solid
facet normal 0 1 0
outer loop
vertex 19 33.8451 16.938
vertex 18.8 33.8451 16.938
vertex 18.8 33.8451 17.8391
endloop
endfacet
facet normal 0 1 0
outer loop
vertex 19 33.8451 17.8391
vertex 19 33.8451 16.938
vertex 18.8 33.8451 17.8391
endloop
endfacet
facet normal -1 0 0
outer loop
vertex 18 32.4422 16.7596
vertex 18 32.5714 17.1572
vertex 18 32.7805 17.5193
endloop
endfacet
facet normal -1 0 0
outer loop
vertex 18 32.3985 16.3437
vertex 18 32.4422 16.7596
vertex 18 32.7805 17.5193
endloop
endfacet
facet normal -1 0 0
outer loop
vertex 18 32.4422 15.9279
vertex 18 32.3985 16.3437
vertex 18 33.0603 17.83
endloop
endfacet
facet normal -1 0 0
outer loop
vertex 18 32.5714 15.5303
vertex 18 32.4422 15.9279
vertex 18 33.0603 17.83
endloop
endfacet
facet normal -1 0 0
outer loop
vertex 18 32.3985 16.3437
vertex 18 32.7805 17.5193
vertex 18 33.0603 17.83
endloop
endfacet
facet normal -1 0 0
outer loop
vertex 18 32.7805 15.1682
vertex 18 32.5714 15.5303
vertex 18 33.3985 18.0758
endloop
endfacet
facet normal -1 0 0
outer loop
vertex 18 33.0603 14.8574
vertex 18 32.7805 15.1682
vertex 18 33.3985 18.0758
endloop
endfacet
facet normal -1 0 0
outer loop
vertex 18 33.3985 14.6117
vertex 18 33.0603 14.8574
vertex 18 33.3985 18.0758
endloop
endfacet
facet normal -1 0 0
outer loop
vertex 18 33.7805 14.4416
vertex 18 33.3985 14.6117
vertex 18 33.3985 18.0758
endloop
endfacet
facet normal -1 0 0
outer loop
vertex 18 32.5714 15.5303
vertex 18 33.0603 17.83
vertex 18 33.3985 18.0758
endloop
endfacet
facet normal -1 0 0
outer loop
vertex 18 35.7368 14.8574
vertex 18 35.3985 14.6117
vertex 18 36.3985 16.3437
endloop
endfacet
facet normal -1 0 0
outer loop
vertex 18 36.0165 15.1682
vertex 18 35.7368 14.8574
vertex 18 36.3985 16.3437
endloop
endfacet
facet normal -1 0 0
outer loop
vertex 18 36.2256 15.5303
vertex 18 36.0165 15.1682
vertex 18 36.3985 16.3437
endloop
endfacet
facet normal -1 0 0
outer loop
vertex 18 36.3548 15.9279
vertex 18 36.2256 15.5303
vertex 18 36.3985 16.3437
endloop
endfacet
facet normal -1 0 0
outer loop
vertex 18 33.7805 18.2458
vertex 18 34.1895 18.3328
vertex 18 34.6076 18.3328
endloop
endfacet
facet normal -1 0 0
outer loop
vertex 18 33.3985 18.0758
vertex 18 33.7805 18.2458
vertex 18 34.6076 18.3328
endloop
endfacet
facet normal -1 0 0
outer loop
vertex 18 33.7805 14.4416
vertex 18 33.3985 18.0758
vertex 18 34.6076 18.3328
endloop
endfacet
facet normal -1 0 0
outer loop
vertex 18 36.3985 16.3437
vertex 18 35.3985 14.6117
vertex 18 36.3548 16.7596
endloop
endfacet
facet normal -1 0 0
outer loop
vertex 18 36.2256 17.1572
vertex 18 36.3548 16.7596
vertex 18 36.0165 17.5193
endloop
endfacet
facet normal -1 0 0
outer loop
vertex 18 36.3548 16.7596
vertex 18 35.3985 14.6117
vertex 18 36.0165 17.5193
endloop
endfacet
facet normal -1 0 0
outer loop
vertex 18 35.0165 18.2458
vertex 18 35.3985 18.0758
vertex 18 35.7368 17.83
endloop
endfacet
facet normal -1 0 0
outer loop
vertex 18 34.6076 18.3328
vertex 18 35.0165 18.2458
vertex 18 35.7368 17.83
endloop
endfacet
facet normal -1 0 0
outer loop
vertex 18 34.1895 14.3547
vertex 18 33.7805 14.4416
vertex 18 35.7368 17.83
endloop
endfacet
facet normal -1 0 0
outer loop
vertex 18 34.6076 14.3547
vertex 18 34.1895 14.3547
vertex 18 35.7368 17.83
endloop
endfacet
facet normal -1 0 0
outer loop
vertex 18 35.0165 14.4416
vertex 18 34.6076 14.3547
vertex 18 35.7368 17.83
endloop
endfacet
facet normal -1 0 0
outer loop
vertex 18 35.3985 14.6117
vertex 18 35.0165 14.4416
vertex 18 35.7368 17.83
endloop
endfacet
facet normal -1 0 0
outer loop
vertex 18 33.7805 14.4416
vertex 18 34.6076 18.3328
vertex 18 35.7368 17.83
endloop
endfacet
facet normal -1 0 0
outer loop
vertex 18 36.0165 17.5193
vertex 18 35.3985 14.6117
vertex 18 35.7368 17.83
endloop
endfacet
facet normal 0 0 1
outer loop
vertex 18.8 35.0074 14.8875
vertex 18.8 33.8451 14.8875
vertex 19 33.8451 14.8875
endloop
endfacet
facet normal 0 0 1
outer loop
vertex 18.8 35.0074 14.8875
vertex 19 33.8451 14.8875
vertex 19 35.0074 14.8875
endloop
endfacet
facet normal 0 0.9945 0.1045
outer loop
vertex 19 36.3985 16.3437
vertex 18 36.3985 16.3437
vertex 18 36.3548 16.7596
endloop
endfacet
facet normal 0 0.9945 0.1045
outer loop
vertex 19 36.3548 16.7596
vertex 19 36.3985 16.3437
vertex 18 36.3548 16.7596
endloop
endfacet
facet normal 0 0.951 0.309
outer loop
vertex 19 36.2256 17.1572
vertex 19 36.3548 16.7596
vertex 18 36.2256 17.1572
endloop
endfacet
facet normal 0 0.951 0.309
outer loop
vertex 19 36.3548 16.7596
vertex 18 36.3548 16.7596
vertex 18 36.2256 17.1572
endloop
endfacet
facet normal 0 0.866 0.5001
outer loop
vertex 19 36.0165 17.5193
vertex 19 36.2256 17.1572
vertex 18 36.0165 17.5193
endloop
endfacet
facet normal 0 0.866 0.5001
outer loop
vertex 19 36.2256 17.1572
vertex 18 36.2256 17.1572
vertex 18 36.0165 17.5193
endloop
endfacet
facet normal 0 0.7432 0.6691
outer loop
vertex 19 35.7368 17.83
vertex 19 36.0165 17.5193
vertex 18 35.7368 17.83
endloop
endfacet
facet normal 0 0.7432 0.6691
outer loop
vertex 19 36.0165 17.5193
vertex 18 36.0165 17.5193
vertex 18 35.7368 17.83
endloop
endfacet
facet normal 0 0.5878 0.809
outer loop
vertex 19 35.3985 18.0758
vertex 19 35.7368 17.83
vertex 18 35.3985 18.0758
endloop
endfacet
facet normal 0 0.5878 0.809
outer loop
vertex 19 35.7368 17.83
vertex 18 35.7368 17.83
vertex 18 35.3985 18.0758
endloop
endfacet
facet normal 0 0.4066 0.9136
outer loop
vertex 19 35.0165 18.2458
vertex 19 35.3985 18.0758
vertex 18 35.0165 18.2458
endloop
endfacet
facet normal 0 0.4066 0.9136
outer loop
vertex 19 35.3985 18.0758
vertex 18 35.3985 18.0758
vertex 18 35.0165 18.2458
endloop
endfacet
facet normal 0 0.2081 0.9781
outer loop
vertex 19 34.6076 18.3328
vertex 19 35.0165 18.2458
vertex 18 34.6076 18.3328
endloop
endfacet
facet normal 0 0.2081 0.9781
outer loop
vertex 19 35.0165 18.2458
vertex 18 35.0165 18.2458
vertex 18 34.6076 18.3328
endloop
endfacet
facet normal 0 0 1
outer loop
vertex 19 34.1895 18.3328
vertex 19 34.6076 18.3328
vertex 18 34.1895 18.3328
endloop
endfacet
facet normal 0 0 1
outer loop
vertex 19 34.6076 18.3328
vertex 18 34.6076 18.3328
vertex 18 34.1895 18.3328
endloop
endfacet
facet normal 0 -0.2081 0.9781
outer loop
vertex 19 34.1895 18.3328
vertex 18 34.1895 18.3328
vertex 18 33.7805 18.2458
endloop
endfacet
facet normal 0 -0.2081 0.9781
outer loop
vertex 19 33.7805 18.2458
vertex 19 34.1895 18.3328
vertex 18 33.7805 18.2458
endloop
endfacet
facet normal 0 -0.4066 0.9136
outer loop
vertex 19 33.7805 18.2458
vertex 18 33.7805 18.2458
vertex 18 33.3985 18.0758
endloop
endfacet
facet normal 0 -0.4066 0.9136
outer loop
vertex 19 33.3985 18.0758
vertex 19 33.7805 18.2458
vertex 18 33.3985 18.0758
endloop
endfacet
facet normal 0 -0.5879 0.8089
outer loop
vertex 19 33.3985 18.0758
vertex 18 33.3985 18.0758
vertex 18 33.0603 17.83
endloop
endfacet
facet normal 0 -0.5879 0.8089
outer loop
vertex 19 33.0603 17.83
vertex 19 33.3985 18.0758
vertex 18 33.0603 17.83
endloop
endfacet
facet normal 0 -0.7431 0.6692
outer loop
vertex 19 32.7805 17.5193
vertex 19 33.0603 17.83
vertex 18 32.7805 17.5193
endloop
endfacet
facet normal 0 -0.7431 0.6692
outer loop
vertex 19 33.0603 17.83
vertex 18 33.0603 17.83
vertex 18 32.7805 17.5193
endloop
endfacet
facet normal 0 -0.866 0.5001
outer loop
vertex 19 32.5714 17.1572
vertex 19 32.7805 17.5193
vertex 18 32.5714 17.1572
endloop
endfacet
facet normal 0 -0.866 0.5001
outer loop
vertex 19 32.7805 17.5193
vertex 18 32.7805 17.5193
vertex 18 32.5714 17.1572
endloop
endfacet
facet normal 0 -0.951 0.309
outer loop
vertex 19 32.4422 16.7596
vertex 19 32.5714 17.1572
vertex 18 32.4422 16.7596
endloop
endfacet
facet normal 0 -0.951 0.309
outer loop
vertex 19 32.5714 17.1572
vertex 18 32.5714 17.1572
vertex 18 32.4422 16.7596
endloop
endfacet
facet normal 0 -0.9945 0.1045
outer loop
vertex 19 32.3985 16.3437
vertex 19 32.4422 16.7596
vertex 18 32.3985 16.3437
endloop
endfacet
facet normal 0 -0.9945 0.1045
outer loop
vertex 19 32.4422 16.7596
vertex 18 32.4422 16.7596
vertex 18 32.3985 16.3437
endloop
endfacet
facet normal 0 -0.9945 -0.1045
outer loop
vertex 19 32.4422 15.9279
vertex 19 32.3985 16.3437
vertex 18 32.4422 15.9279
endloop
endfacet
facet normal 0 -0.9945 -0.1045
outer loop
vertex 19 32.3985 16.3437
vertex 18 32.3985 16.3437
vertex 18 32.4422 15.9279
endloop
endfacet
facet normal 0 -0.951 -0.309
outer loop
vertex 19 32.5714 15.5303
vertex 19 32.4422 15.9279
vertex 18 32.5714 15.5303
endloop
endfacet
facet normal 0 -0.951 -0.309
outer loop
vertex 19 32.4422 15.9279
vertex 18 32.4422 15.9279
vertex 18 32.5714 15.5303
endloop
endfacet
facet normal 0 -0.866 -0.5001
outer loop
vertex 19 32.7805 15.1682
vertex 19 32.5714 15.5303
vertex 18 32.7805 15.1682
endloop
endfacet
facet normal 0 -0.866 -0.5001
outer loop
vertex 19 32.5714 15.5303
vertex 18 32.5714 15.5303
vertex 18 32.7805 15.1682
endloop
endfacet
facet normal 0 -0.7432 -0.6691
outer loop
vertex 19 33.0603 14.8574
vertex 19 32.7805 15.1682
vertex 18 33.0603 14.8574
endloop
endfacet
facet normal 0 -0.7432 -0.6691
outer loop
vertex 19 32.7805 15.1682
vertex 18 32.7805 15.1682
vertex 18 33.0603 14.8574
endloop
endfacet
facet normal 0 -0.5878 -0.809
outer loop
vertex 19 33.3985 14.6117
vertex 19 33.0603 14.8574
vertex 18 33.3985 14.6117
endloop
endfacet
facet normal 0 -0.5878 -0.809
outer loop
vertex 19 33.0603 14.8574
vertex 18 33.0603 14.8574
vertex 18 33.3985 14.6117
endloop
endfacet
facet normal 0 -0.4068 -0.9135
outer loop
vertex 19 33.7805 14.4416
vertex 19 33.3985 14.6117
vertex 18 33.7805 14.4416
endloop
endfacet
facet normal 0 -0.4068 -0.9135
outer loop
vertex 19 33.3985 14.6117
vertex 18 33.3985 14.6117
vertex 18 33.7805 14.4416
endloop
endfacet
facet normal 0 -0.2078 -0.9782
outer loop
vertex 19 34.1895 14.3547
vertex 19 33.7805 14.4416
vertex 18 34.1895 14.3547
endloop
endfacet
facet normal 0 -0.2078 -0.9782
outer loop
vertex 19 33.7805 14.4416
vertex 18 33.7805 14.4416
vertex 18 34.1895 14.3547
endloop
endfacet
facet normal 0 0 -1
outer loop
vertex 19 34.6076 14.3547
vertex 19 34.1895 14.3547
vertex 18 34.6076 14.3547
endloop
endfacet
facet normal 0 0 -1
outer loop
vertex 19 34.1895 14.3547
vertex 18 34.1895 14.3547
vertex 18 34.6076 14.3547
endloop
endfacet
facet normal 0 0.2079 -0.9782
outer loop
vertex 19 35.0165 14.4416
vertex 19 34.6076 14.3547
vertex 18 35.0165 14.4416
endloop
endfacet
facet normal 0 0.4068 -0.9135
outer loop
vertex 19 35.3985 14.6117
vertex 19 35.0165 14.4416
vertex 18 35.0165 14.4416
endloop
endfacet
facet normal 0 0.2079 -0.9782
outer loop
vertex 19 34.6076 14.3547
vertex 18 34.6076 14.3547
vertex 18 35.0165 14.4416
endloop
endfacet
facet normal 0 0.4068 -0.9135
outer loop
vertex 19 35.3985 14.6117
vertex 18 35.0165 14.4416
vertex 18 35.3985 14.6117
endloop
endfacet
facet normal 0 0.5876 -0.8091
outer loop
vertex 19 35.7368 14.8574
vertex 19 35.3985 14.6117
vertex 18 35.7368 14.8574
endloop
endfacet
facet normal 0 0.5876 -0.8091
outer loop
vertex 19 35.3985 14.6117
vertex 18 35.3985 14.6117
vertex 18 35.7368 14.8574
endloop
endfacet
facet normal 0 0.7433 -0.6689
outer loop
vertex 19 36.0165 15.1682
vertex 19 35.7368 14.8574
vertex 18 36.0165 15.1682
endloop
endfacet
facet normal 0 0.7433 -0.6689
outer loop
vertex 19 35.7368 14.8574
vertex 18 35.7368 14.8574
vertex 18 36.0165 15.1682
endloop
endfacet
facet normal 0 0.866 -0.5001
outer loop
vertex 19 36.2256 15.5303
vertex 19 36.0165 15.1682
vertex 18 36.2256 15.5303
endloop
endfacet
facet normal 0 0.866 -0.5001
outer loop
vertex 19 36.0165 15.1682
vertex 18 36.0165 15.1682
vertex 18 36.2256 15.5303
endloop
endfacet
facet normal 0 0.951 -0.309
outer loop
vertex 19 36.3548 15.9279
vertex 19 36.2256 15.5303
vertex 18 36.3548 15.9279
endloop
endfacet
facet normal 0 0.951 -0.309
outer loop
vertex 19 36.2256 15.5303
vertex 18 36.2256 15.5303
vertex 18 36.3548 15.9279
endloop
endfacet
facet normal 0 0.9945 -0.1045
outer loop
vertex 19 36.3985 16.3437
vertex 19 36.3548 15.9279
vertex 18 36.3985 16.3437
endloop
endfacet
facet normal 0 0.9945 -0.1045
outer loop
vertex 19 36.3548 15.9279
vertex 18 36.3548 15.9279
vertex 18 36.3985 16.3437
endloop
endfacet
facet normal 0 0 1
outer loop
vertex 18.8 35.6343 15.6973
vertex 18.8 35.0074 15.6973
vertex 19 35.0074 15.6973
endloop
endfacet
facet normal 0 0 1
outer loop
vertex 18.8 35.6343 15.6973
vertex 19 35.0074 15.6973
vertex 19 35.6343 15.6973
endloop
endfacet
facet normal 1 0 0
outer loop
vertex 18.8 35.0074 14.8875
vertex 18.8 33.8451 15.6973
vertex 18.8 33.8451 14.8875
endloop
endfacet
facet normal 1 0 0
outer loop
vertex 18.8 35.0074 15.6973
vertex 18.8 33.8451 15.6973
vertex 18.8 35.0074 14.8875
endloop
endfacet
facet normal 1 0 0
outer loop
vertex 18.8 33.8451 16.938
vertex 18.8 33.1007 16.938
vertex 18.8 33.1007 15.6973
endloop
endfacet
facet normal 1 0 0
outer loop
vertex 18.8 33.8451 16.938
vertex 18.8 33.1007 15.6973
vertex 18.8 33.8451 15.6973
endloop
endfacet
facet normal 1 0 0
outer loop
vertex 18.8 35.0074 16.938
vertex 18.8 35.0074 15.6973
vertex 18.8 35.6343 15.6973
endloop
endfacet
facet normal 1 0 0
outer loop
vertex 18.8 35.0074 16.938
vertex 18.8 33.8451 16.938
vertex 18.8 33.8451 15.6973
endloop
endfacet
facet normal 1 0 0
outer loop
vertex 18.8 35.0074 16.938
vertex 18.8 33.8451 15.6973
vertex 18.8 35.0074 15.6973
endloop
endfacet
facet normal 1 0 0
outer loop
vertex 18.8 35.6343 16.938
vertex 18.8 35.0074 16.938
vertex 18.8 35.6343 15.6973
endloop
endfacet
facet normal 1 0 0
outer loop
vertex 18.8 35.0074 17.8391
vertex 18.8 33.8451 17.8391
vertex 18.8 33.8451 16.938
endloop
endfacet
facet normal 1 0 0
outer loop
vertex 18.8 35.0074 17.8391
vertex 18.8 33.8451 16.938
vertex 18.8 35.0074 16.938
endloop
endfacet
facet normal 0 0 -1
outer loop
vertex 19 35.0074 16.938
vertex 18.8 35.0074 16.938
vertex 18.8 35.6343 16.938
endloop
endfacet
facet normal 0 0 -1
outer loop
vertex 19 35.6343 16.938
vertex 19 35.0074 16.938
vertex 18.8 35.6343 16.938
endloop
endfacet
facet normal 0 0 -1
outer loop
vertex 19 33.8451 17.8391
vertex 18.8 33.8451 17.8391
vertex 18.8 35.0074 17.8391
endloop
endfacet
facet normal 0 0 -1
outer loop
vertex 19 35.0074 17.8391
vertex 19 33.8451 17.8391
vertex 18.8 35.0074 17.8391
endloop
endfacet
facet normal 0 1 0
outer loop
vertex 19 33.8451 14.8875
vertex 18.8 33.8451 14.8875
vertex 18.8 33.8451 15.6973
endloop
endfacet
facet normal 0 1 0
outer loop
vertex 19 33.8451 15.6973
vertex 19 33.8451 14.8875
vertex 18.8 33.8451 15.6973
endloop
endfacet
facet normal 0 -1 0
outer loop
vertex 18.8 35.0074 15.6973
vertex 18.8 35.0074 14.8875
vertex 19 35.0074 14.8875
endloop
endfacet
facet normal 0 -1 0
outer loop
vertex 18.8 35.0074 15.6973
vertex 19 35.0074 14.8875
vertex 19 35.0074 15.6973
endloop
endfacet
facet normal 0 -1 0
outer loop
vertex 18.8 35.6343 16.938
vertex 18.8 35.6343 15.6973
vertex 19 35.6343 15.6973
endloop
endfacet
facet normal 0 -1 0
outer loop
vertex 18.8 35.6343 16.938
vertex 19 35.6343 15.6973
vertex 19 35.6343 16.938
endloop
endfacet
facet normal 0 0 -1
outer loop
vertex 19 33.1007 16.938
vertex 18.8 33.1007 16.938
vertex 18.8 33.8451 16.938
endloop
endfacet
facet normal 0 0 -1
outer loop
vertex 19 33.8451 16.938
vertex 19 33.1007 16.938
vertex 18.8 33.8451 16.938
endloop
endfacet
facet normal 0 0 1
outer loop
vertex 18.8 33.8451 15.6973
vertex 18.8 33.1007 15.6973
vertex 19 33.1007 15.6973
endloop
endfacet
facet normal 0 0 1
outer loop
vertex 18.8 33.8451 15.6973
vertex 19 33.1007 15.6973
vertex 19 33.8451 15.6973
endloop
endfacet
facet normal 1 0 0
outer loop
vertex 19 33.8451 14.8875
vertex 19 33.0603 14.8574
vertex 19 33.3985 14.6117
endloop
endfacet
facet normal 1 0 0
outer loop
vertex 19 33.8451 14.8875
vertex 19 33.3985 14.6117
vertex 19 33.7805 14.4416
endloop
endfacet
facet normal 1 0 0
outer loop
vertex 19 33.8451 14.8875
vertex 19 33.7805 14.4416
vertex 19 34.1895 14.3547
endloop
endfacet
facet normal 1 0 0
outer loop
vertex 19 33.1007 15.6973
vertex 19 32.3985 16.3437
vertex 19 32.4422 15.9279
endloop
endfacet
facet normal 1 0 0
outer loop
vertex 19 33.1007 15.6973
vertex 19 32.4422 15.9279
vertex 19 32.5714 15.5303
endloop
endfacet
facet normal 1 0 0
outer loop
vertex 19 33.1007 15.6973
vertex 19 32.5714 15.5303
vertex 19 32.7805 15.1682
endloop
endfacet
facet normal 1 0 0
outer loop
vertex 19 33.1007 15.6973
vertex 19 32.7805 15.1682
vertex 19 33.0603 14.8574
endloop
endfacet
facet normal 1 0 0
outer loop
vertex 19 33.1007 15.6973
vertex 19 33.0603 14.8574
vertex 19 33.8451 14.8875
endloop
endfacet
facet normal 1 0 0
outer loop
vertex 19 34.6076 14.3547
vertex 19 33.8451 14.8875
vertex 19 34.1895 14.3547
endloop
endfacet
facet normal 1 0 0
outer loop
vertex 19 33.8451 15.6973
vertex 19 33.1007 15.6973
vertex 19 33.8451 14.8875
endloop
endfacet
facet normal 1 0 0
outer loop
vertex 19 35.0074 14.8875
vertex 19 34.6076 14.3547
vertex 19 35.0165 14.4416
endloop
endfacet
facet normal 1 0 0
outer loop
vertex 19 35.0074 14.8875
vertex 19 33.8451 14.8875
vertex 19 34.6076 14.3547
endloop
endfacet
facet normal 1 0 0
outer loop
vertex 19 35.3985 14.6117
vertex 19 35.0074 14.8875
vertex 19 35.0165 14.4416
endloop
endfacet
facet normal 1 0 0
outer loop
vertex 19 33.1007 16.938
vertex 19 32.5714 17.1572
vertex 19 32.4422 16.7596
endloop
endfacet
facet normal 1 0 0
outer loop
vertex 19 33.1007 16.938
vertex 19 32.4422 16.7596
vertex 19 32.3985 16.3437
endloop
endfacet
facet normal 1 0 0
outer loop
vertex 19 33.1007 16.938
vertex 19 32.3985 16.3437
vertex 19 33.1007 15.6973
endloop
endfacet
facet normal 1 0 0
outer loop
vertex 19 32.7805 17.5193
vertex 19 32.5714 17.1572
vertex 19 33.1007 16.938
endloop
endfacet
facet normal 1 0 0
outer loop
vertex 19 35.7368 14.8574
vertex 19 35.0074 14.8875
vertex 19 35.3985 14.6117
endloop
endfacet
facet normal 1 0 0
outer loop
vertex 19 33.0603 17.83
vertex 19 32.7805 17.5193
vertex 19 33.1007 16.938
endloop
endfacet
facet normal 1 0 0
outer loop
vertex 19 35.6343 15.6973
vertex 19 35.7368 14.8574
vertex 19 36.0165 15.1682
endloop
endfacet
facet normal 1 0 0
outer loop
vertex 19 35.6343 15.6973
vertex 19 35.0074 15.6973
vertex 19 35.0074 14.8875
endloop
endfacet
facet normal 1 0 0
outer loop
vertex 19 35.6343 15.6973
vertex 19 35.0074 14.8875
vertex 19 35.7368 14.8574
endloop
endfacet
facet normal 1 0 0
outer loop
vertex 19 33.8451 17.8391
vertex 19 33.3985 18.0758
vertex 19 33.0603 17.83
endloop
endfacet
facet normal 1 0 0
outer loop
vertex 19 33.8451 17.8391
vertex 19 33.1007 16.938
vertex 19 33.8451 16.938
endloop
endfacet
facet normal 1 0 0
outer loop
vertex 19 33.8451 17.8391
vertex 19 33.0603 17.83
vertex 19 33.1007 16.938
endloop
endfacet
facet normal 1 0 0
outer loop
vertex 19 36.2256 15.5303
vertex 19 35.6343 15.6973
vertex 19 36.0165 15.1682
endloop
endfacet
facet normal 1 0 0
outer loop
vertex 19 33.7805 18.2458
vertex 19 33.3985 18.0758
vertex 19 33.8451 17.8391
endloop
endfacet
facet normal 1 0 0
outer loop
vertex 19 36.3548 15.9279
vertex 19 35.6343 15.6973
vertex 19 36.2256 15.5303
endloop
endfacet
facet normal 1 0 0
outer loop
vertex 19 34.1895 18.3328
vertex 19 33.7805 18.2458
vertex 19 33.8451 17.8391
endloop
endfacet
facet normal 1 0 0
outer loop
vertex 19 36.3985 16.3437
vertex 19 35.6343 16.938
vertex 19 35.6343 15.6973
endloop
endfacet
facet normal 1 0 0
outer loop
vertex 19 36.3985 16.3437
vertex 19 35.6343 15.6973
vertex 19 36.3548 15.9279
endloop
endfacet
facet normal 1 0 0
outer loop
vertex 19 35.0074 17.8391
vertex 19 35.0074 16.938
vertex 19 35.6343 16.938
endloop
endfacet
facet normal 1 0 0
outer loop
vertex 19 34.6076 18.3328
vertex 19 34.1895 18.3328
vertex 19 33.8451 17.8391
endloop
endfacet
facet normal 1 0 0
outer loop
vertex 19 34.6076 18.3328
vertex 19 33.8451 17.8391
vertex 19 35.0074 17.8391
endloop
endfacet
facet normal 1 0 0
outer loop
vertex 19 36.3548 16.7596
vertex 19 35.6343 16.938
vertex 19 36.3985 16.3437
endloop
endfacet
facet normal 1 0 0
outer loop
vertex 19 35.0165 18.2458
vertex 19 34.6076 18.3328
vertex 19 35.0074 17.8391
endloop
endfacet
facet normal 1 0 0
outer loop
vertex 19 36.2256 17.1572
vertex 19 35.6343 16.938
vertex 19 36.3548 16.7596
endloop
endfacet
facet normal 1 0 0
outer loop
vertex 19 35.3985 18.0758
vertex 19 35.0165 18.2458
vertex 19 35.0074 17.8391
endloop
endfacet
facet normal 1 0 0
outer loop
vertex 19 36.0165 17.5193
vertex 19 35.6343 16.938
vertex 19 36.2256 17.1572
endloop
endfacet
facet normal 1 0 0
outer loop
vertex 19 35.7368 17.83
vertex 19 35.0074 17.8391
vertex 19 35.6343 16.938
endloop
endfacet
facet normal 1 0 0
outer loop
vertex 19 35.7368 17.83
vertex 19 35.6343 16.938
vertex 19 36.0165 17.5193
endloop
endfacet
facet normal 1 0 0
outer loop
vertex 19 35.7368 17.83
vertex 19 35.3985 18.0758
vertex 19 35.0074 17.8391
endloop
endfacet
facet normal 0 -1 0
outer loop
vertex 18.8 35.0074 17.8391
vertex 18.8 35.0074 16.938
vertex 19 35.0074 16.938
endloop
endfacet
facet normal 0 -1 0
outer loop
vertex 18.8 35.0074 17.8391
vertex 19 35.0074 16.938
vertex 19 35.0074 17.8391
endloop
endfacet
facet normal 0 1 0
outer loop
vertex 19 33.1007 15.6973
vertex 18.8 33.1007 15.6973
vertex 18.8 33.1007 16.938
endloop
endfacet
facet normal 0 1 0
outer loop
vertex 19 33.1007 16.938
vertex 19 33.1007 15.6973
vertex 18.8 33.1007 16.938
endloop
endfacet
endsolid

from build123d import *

# Parameters (mm, degrees)
RECTANGLE011_W   = 1.162341
RECTANGLE011_H   = 2.951559
EXTRUDE034_DEPTH = 0.5
RECTANGLE010_W   = 2.533642
RECTANGLE010_H   = 1.2407
EXTRUDE033_DEPTH = 0.5
CIRCLE016_R      = 2
EXTRUDE032_DEPTH = 1


with BuildPart() as extrude034:
    # Rectangle011 → Extrude034 (new body)
    with BuildSketch(Plane(origin=(1, -5.654904, 34.839096), x_dir=(0, 1, 0), z_dir=(1, 0, 0))):
        with Locations((0.58117, -1.47578)):
            Rectangle(RECTANGLE011_W, RECTANGLE011_H)
    extrude(amount=EXTRUDE034_DEPTH)


with BuildPart() as extrude034_1:
    # Extrude034 placement: moved
    add(extrude034.part.moved(Location((-0.2, 0, 0))))


with BuildPart() as extrude033:
    # Rectangle010 → Extrude033 (new body)
    with BuildSketch(Plane(origin=(1, -6.399324, 33.937958), x_dir=(0, 1, 0), z_dir=(1, 0, 0))):
        with Locations((1.266821, -0.62035)):
            Rectangle(RECTANGLE010_W, RECTANGLE010_H)
    extrude(amount=EXTRUDE033_DEPTH)


with BuildPart() as extrude033_1:
    # Extrude033 placement: moved
    add(extrude033.part.moved(Location((-0.2, 0, 0))))


with BuildPart() as parafuso1:
    # Circle016 → Extrude032 (new body)
    with BuildSketch(Plane(origin=(0, -5.101484, 33.343727), x_dir=(0, 1, 0), z_dir=(1, 0, 0))):
        Circle(CIRCLE016_R)
    extrude(amount=EXTRUDE032_DEPTH)

    # Cut007: cut Extrude033
    add(extrude033_1.part, mode=Mode.SUBTRACT)

    # Cut008: cut Extrude034
    add(extrude034_1.part, mode=Mode.SUBTRACT)


with BuildPart() as parafuso1_1:
    # Cut008 placement: moved
    add(parafuso1.part.moved(Location((18, 39.5, -17))))


solid = parafuso1_1.part
